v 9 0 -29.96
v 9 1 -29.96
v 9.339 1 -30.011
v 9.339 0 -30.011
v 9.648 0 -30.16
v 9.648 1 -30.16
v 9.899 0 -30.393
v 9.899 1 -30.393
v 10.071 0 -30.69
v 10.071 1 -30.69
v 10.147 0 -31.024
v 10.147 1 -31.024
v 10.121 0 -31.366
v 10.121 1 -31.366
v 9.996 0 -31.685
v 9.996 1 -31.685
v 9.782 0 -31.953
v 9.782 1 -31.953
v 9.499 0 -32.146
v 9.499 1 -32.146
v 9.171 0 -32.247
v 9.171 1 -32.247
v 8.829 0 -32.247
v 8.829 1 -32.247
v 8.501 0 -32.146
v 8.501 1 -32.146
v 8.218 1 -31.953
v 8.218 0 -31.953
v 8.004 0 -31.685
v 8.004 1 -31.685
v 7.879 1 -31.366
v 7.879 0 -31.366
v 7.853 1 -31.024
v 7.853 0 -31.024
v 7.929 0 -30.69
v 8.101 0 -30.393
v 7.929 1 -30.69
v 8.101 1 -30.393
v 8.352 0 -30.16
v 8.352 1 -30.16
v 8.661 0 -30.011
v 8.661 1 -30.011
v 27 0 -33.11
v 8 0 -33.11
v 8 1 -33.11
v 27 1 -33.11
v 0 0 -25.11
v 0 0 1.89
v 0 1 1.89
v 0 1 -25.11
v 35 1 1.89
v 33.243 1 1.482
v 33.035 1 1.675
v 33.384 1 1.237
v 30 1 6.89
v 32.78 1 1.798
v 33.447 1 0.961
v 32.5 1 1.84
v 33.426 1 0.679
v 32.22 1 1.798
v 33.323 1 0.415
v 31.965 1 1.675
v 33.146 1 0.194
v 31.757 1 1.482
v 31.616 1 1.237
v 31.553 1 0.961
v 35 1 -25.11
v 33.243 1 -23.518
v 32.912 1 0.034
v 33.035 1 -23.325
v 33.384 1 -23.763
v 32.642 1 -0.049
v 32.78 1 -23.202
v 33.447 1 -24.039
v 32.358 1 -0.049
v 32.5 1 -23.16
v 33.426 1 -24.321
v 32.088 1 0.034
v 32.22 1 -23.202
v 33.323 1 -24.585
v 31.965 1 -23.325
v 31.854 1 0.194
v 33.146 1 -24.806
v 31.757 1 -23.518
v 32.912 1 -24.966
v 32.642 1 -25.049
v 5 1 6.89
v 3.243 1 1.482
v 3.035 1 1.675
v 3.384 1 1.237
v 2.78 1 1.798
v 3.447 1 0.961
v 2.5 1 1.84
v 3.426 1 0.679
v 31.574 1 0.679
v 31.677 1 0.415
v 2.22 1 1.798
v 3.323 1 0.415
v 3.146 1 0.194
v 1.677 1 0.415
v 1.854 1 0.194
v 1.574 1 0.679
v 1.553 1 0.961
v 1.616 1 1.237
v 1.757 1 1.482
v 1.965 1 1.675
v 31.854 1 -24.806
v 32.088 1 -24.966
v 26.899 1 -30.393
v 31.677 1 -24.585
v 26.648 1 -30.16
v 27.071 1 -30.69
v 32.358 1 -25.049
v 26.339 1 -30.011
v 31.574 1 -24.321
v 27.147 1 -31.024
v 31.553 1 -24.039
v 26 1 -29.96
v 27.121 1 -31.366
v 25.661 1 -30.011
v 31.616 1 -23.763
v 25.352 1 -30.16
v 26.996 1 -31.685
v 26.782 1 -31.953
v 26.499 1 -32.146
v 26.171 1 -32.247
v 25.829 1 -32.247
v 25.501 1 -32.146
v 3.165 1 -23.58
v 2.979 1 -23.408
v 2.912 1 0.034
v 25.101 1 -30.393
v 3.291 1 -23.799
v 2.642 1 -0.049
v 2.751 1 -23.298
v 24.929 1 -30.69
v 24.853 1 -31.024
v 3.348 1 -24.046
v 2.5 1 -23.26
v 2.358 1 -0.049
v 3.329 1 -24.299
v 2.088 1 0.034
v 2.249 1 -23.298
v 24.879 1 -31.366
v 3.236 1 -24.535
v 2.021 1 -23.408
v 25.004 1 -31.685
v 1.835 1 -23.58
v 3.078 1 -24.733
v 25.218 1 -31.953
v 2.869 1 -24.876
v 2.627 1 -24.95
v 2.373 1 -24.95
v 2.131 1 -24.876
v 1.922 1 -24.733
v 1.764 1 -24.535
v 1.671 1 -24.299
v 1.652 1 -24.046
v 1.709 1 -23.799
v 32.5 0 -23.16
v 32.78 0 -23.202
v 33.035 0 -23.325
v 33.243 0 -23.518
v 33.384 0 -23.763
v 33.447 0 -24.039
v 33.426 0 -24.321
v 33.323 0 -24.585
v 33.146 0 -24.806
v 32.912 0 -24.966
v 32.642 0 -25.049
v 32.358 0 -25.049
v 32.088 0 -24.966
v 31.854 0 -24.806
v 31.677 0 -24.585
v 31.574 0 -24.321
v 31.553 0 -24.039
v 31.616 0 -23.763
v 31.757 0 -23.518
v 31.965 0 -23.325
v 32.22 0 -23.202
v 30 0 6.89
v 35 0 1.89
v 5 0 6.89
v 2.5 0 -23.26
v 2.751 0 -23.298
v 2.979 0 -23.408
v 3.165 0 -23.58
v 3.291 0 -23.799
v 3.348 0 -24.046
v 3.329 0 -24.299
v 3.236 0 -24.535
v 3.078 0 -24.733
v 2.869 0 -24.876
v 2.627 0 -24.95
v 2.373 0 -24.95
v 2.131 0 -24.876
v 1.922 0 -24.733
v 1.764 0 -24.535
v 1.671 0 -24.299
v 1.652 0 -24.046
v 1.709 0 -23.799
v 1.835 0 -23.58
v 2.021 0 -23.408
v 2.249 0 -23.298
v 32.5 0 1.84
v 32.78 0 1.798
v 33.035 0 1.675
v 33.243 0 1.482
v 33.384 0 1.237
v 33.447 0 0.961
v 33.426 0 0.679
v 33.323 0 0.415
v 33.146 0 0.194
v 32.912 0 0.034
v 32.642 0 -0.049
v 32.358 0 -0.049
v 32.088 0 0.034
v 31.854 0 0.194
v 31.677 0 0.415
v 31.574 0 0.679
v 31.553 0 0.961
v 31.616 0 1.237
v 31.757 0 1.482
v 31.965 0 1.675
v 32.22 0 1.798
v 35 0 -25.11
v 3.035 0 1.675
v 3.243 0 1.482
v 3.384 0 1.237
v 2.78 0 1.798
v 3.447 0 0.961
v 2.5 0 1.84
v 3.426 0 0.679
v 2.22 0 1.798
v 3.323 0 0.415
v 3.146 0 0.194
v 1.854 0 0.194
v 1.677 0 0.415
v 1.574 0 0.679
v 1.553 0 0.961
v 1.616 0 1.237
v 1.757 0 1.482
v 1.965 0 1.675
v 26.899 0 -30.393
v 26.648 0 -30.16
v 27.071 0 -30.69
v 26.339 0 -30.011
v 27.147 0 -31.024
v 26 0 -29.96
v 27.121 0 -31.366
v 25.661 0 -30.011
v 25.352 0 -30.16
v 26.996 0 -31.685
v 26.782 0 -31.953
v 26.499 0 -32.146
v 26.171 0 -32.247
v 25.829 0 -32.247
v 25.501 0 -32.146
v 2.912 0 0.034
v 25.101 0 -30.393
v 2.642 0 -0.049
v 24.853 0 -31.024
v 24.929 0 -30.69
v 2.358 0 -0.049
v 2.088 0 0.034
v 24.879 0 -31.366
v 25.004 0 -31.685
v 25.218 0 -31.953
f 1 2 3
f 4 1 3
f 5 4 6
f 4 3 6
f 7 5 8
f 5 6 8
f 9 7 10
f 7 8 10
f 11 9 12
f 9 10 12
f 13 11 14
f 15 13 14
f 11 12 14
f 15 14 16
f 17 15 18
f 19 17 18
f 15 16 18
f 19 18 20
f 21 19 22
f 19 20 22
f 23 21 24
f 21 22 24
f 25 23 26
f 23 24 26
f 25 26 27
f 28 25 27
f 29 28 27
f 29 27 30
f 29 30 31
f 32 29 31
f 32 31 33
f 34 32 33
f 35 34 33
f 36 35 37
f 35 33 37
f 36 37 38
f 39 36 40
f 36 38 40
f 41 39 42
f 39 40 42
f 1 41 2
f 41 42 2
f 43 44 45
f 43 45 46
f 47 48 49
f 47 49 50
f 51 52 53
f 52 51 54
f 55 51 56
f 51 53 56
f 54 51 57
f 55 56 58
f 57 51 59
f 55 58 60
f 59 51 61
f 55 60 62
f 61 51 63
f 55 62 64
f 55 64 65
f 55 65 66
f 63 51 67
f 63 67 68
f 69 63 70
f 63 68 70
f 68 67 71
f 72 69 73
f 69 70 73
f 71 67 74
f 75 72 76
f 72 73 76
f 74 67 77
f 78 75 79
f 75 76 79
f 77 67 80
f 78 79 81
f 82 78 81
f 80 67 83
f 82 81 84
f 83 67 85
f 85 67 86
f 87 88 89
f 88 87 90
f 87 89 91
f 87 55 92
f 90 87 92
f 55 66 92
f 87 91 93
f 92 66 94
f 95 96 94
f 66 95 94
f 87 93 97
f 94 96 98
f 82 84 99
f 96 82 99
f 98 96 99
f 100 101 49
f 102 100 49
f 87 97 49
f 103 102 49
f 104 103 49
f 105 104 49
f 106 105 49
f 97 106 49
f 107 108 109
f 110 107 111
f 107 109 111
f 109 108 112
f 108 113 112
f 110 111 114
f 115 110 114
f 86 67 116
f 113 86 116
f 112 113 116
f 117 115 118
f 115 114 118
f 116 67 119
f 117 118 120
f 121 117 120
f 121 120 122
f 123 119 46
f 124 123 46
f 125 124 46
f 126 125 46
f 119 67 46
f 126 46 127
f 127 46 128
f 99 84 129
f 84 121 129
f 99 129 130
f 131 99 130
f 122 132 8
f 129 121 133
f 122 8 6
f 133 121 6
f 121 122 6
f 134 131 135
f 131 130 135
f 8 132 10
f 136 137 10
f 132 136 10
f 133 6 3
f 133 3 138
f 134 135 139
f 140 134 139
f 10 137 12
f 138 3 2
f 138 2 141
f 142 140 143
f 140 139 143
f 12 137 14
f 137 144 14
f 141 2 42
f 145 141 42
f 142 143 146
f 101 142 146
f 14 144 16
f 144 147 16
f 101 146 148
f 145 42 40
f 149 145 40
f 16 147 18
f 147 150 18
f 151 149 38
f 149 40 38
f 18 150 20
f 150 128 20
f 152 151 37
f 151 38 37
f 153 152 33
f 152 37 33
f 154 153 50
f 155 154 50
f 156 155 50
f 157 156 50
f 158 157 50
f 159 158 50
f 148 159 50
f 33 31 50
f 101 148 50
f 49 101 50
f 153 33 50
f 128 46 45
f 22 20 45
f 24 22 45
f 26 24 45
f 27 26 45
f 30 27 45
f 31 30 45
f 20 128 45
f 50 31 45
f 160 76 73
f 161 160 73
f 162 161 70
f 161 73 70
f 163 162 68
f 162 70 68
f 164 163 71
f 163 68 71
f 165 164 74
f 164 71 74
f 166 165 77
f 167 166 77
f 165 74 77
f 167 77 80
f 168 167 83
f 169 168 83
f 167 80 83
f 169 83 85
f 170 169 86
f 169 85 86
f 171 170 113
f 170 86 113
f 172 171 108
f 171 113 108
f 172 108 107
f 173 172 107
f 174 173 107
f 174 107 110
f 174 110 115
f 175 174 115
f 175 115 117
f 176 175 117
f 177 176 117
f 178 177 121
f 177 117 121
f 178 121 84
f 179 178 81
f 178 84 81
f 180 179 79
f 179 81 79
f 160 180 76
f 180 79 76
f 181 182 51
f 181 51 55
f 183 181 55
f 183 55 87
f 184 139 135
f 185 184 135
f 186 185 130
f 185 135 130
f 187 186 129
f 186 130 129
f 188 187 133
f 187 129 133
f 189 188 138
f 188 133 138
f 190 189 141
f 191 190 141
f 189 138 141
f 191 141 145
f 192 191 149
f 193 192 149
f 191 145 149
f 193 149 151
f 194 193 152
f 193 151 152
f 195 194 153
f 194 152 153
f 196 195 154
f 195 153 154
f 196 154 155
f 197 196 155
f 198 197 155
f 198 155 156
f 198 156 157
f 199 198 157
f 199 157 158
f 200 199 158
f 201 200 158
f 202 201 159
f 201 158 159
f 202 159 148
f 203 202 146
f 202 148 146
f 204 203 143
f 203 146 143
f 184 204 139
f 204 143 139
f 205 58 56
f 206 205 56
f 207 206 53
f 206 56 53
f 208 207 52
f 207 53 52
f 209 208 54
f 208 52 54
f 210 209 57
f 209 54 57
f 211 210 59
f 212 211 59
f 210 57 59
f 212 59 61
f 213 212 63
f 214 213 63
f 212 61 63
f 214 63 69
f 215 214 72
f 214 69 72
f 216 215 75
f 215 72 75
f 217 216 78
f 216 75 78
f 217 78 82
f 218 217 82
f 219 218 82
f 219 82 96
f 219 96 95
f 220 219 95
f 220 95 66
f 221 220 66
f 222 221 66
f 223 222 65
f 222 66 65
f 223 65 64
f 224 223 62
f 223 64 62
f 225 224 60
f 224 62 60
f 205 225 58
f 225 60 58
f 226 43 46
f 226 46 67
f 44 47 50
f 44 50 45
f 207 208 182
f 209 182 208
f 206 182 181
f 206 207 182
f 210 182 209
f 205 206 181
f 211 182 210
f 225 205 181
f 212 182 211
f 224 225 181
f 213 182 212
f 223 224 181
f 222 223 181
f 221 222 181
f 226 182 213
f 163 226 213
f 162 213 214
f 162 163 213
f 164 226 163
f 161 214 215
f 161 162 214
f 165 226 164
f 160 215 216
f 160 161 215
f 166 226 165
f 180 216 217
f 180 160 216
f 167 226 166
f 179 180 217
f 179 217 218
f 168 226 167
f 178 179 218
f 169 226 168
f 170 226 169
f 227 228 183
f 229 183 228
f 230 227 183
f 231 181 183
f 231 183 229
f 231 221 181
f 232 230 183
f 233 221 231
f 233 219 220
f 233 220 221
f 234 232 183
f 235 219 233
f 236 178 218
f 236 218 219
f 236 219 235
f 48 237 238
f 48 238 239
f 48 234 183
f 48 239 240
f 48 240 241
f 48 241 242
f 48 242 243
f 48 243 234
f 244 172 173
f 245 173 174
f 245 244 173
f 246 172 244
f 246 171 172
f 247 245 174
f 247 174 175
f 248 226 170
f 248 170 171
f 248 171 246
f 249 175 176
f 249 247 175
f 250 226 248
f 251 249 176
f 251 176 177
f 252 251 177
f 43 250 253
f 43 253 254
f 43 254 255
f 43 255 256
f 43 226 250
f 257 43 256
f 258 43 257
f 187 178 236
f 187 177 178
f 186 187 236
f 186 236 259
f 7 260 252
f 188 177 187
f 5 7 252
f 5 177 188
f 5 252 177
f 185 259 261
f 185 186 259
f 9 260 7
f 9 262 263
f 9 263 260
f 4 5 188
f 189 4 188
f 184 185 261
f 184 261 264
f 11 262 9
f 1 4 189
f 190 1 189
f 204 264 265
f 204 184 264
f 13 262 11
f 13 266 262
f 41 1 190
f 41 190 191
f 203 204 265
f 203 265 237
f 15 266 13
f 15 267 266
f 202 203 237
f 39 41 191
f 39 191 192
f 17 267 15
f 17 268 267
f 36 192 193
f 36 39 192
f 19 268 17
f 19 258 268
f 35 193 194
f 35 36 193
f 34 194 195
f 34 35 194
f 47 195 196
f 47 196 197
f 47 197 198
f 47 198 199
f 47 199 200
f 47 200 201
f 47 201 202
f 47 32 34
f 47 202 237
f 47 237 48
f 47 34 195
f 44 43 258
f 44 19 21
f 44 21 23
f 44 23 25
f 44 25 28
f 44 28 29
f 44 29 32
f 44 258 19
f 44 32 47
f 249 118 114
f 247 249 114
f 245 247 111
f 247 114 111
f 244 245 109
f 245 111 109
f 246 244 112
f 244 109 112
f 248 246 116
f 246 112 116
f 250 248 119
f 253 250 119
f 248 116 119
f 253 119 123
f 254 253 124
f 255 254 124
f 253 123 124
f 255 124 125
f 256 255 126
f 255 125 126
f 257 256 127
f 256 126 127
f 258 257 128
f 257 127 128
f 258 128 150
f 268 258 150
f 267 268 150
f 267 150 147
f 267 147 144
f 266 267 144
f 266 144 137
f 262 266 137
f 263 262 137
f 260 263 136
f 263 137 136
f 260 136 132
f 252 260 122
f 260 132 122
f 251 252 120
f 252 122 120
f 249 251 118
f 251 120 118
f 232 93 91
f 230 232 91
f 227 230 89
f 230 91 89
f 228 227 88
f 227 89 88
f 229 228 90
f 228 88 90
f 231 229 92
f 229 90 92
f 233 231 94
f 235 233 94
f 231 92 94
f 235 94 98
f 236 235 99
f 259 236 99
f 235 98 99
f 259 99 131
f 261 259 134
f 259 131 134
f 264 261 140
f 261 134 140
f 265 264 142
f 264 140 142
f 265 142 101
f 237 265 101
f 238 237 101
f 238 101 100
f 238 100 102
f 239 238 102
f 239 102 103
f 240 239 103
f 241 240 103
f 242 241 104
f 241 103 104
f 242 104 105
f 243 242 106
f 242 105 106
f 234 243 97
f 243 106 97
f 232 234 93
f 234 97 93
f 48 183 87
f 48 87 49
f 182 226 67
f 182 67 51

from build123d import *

# Parameters (mm, degrees)
BOSS_EXTRUDE1_DEPTH = 1
SKETCH2_R           = 0.95
SKETCH2_R_2         = 0.85
CUT_EXTRUDE1_DEPTH  = 1
SKETCH3_R           = 1.15
CUT_EXTRUDE2_DEPTH  = 1


with BuildPart() as part:
    # Sketch1 → Boss-Extrude1 (new body)
    with BuildSketch(Plane(origin=(0, 0, 0), x_dir=(1, 0, 0), z_dir=(0, 1, 0))):
        Polygon((30, -6.890061842), (5, -6.890061842), (0, -1.890061842), (0, 25.109938158), (8, 33.109938158), (27, 33.109938158), (35, 25.109938158), (35, -1.890061842), align=None)
    extrude(amount=BOSS_EXTRUDE1_DEPTH)

    # Sketch2 → Cut-Extrude1 (cut)
    with BuildSketch(Plane(origin=(0, 1, 0), x_dir=(1, 0, 0), z_dir=(0, 1, 0))):
        with Locations(Location((32.5, -0.890061842, 0), (0, 0, 270))):
            Circle(SKETCH2_R)
        with Locations(Location((2.5, -0.890061842, 0), (0, 0, 270))):
            Circle(SKETCH2_R)
        with Locations(Location((32.5, 24.109938158, 0), (0, 0, 270))):
            Circle(SKETCH2_R)
        with Locations(Location((2.5, 24.109938158, 0), (0, 0, 270))):
            Circle(SKETCH2_R_2)
    extrude(amount=-CUT_EXTRUDE1_DEPTH, mode=Mode.SUBTRACT)

    # Sketch3 → Cut-Extrude2 (cut)
    with BuildSketch(Plane(origin=(0, 1, 0), x_dir=(1, 0, 0), z_dir=(0, 1, 0))):
        with Locations(Location((26, 31.109938158, 0), (0, 0, 270))):
            Circle(SKETCH3_R)
        with Locations(Location((9, 31.109938158, 0), (0, 0, 270))):
            Circle(SKETCH3_R)
    extrude(amount=-CUT_EXTRUDE2_DEPTH, mode=Mode.SUBTRACT)


solid = part.part
